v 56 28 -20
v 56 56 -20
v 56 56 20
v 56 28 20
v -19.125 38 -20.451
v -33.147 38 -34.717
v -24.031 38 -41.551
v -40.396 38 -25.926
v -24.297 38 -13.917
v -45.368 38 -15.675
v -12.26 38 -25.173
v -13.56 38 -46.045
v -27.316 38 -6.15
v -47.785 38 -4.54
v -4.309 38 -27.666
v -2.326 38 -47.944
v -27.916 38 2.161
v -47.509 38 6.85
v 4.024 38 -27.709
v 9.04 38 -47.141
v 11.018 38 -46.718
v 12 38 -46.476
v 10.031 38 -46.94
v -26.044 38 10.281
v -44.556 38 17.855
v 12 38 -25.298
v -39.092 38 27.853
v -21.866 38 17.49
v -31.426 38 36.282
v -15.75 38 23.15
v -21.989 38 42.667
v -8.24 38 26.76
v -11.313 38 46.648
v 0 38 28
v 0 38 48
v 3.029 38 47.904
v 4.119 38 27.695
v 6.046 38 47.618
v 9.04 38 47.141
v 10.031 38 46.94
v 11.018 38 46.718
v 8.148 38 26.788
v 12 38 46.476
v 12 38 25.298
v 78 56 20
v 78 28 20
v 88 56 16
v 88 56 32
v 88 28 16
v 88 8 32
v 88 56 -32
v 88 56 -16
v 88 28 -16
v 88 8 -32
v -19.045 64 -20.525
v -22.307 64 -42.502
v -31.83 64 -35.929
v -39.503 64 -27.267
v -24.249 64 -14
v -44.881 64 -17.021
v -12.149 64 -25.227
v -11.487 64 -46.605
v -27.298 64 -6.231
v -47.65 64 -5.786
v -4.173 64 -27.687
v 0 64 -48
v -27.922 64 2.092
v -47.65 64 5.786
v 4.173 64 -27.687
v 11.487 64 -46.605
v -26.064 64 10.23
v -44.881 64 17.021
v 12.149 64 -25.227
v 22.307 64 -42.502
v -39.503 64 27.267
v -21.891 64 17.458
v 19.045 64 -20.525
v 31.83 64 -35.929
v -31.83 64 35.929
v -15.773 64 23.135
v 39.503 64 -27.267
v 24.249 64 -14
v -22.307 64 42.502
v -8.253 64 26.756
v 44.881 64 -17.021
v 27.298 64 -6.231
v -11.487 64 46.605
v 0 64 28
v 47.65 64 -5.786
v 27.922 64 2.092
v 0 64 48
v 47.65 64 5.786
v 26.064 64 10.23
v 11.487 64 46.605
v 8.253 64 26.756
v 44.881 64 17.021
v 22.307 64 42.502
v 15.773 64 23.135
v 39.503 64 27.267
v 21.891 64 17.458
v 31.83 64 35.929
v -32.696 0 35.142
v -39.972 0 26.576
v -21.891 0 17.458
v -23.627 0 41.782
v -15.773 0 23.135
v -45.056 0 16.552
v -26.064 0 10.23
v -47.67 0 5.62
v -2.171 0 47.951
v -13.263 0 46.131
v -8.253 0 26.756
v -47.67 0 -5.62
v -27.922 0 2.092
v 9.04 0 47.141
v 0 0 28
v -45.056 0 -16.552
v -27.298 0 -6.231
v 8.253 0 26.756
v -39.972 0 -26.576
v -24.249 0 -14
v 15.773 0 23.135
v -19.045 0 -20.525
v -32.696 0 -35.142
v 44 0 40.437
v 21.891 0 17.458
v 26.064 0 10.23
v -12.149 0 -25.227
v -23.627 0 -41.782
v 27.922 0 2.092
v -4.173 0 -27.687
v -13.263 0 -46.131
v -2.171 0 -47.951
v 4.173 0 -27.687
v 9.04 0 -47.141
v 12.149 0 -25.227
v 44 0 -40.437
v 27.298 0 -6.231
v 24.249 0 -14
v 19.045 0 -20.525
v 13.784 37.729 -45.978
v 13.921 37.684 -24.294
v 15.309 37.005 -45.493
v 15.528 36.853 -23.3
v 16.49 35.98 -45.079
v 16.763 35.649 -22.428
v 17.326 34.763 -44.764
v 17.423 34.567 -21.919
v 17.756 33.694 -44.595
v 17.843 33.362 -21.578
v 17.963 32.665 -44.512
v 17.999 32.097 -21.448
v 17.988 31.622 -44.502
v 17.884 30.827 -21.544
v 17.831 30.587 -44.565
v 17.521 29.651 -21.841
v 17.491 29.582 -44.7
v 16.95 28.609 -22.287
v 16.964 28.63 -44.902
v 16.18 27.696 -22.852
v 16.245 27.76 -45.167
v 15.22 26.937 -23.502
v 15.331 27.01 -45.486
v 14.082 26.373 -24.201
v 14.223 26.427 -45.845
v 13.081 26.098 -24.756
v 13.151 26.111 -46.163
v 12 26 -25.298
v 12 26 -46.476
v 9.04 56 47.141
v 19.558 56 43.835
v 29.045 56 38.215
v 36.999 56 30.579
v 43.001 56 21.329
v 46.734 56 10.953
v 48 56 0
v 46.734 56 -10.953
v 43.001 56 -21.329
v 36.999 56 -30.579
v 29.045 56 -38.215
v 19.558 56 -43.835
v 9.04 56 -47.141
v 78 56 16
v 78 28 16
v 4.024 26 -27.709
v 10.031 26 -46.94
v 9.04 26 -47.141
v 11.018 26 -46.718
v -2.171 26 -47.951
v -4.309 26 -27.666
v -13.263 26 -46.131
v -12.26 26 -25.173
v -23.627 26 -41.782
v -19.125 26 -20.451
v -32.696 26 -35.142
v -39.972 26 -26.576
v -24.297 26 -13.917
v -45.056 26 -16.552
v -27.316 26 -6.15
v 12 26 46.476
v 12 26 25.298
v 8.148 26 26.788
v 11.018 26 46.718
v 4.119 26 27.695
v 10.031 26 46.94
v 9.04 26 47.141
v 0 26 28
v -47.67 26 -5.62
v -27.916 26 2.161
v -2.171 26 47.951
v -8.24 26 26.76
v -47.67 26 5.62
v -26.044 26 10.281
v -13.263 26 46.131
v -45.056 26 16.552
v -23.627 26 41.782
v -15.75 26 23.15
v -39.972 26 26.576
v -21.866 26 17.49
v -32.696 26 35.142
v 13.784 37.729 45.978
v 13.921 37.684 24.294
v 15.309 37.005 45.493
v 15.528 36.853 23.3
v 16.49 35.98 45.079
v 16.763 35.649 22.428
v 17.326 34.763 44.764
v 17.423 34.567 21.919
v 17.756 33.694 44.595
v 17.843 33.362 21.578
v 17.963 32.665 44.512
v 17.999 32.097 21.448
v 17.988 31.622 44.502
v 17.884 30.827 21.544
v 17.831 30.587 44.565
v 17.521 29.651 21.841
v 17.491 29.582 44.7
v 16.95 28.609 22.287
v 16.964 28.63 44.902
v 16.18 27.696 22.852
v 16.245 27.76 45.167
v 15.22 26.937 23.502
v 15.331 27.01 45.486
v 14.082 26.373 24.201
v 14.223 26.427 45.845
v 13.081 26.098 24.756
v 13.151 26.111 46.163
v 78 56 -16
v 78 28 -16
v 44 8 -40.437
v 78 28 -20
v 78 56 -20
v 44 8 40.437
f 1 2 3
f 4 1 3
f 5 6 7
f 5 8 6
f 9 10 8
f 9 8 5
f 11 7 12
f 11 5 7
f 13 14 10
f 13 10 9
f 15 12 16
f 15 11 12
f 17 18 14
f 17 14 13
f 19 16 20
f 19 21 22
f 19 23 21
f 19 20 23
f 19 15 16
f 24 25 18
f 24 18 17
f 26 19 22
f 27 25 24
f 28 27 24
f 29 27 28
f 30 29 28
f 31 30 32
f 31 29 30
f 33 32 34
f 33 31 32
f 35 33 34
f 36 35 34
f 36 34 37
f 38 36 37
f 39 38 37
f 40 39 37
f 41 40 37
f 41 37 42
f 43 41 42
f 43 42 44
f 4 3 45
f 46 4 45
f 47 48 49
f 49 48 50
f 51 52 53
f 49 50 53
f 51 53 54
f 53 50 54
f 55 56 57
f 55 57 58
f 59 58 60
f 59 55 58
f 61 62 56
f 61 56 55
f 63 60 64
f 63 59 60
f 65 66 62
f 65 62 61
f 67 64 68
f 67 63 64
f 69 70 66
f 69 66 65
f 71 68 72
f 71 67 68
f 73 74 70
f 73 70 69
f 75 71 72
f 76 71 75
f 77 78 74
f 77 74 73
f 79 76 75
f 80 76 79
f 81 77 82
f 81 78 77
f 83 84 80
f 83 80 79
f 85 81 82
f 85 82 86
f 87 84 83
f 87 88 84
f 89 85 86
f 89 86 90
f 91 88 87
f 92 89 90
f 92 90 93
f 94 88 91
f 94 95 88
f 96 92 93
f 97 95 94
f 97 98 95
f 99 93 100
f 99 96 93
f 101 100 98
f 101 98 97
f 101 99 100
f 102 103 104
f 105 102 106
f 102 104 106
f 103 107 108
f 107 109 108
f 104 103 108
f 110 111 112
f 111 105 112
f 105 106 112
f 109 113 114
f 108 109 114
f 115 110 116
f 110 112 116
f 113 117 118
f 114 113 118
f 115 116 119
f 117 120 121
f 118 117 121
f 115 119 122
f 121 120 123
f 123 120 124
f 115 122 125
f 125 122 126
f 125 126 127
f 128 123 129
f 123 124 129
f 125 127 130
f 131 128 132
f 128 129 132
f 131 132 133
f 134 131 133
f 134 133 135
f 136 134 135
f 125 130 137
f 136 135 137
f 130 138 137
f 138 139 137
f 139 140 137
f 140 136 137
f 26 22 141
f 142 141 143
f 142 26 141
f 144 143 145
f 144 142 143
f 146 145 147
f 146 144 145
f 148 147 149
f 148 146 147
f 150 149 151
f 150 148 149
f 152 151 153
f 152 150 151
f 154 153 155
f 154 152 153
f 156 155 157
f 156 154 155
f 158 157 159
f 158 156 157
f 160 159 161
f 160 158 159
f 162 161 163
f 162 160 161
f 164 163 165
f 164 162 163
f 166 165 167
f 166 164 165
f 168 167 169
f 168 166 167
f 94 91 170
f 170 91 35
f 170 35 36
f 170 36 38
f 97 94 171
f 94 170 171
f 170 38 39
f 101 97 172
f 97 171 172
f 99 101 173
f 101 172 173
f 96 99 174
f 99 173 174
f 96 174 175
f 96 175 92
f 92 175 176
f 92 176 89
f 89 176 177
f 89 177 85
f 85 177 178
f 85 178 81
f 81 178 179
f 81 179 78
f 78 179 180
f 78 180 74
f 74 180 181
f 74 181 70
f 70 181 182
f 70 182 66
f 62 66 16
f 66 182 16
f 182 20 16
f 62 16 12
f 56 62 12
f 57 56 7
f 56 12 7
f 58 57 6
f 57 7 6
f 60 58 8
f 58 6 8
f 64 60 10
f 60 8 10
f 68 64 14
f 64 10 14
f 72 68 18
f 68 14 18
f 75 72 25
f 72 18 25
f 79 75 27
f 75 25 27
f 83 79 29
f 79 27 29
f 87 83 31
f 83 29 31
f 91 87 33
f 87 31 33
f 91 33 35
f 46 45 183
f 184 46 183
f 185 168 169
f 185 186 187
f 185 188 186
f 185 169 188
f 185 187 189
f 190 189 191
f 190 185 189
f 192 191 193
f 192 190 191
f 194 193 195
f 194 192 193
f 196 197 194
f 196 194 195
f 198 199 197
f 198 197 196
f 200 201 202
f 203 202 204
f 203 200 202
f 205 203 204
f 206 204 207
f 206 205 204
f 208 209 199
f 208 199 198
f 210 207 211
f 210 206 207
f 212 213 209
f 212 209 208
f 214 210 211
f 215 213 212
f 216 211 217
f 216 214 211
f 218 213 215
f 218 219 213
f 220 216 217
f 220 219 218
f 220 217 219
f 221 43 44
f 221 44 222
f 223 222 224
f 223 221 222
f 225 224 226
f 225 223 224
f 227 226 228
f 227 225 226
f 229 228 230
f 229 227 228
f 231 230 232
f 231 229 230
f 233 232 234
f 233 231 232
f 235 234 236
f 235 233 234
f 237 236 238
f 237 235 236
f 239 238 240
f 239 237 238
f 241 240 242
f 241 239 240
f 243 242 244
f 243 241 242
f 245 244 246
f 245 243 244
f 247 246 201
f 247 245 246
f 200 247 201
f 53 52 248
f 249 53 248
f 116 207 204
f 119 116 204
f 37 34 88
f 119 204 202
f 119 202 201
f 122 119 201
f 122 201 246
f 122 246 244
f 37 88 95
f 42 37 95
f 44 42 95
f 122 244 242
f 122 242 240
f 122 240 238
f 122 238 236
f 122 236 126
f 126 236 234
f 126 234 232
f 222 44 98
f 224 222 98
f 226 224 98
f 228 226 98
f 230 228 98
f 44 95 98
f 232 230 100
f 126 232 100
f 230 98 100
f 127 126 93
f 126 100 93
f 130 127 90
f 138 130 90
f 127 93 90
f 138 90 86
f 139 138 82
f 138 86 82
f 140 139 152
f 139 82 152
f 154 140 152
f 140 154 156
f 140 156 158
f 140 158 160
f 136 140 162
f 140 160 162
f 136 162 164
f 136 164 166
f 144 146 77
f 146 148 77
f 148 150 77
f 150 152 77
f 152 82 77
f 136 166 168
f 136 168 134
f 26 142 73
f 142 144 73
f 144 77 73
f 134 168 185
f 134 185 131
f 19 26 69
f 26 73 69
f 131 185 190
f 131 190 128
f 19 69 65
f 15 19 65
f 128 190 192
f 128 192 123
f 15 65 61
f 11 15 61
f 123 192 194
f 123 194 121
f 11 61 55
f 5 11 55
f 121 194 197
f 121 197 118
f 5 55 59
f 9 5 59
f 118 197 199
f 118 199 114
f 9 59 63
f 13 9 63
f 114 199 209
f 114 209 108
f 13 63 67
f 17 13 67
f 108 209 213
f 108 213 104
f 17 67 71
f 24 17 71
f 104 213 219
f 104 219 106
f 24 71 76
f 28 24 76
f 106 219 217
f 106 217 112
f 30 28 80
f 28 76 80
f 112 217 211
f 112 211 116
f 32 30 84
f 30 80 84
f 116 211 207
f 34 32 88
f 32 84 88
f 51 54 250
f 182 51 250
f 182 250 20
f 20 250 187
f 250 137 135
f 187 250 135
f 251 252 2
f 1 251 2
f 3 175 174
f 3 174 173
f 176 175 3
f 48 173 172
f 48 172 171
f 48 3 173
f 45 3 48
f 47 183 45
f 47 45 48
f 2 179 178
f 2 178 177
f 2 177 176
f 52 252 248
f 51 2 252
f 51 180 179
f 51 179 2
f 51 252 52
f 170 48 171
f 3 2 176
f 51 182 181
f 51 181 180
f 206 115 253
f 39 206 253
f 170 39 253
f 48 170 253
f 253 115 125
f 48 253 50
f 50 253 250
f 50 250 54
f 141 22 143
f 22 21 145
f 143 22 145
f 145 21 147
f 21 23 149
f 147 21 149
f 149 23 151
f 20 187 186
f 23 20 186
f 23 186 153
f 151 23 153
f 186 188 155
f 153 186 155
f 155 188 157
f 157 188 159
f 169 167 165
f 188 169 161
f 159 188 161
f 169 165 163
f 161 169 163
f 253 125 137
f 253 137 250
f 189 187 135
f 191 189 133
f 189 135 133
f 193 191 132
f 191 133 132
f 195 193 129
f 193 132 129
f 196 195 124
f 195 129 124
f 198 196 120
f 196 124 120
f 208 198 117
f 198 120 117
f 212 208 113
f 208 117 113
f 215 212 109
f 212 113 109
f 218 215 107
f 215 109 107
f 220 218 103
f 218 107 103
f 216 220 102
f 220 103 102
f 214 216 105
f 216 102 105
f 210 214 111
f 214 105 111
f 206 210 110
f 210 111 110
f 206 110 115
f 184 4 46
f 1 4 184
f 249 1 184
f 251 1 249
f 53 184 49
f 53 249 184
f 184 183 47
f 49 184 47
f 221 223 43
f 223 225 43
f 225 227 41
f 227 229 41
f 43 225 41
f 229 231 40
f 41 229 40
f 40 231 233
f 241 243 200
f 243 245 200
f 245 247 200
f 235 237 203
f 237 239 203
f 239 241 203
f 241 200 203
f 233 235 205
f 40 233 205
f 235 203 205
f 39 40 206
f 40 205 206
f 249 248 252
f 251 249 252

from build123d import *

# Parameters (mm, degrees)
SKETCH_1_R          = 48
EXTRUDE_1_DEPTH     = 64
CUT_EXTRUDE_1_DEPTH = 67
EXTRUDE_START       = -56
EXTRUDE_2_DEPTH     = 56
CUT_EXTRUDE_2_DEPTH = 28
SKETCH_5_W          = 44
SKETCH_5_H          = 8
CUT_EXTRUDE_3_DEPTH = 54
SKETCH_6_R          = 28
CUT_EXTRUDE_4_DEPTH = 119.928549979


with BuildPart() as part:
    # 草圖1 → 填料-伸長1 (new body)
    with BuildSketch(Plane(origin=(0, 0, 0), x_dir=(1, 0, 0), z_dir=(0, 1, 0))):
        with Locations(Location((0, 0, 0), (0, 0, 270))):
            Circle(SKETCH_1_R)
    extrude(amount=EXTRUDE_1_DEPTH)

    # 草圖2 → 除料-伸長1 (cut, symmetric)
    with BuildSketch(Plane.XY):
        with BuildLine():
            Line((-48, 38), (12, 38))
            ThreePointArc((12, 38), (18, 32), (12, 26))
            Line((12, 26), (-48, 26))
            Line((-48, 26), (-48, 38))
        make_face()
    extrude(amount=CUT_EXTRUDE_1_DEPTH, both=True, mode=Mode.SUBTRACT)

    # 草圖3 → 填料-伸長2 (add)
    with BuildSketch(Plane(origin=(0, 56, 0), x_dir=(1, 0, 0), z_dir=(0, 1, 0)).offset(EXTRUDE_START)):
        with BuildLine():
            Line((88, -32), (88, 32))
            Line((88, 32), (9.03959037, 47.141126481))
            ThreePointArc((9.03959037, 47.141126481), (48, 0), (9.03959037, -47.141126481))
            Line((9.03959037, -47.141126481), (88, -32))
        make_face()
    extrude(amount=EXTRUDE_2_DEPTH)

    # 草圖4 → 除料-伸長2 (cut)
    with BuildSketch(Plane(origin=(0, 56, 0), x_dir=(1, 0, 0), z_dir=(0, 1, 0))):
        Polygon((88, -16), (88, 16), (78, 16), (78, 20), (56, 20), (56, -20), (78, -20), (78, -16), align=None)
    extrude(amount=-CUT_EXTRUDE_2_DEPTH, mode=Mode.SUBTRACT)

    # 草圖5 → 除料-伸長3 (cut, symmetric)
    with BuildSketch(Plane.XY):
        with Locations((66, 4)):
            Rectangle(SKETCH_5_W, SKETCH_5_H)
    extrude(amount=CUT_EXTRUDE_3_DEPTH, both=True, mode=Mode.SUBTRACT)

    # 草圖6 → 除料-伸長4 (cut, through all)
    with BuildSketch(Plane(origin=(0, 64, 0), x_dir=(1, 0, 0), z_dir=(0, 1, 0))):
        with Locations(Location((0, 0, 0), (0, 0, 270))):
            Circle(SKETCH_6_R)
    extrude(amount=-CUT_EXTRUDE_4_DEPTH, mode=Mode.SUBTRACT)


solid = part.part
